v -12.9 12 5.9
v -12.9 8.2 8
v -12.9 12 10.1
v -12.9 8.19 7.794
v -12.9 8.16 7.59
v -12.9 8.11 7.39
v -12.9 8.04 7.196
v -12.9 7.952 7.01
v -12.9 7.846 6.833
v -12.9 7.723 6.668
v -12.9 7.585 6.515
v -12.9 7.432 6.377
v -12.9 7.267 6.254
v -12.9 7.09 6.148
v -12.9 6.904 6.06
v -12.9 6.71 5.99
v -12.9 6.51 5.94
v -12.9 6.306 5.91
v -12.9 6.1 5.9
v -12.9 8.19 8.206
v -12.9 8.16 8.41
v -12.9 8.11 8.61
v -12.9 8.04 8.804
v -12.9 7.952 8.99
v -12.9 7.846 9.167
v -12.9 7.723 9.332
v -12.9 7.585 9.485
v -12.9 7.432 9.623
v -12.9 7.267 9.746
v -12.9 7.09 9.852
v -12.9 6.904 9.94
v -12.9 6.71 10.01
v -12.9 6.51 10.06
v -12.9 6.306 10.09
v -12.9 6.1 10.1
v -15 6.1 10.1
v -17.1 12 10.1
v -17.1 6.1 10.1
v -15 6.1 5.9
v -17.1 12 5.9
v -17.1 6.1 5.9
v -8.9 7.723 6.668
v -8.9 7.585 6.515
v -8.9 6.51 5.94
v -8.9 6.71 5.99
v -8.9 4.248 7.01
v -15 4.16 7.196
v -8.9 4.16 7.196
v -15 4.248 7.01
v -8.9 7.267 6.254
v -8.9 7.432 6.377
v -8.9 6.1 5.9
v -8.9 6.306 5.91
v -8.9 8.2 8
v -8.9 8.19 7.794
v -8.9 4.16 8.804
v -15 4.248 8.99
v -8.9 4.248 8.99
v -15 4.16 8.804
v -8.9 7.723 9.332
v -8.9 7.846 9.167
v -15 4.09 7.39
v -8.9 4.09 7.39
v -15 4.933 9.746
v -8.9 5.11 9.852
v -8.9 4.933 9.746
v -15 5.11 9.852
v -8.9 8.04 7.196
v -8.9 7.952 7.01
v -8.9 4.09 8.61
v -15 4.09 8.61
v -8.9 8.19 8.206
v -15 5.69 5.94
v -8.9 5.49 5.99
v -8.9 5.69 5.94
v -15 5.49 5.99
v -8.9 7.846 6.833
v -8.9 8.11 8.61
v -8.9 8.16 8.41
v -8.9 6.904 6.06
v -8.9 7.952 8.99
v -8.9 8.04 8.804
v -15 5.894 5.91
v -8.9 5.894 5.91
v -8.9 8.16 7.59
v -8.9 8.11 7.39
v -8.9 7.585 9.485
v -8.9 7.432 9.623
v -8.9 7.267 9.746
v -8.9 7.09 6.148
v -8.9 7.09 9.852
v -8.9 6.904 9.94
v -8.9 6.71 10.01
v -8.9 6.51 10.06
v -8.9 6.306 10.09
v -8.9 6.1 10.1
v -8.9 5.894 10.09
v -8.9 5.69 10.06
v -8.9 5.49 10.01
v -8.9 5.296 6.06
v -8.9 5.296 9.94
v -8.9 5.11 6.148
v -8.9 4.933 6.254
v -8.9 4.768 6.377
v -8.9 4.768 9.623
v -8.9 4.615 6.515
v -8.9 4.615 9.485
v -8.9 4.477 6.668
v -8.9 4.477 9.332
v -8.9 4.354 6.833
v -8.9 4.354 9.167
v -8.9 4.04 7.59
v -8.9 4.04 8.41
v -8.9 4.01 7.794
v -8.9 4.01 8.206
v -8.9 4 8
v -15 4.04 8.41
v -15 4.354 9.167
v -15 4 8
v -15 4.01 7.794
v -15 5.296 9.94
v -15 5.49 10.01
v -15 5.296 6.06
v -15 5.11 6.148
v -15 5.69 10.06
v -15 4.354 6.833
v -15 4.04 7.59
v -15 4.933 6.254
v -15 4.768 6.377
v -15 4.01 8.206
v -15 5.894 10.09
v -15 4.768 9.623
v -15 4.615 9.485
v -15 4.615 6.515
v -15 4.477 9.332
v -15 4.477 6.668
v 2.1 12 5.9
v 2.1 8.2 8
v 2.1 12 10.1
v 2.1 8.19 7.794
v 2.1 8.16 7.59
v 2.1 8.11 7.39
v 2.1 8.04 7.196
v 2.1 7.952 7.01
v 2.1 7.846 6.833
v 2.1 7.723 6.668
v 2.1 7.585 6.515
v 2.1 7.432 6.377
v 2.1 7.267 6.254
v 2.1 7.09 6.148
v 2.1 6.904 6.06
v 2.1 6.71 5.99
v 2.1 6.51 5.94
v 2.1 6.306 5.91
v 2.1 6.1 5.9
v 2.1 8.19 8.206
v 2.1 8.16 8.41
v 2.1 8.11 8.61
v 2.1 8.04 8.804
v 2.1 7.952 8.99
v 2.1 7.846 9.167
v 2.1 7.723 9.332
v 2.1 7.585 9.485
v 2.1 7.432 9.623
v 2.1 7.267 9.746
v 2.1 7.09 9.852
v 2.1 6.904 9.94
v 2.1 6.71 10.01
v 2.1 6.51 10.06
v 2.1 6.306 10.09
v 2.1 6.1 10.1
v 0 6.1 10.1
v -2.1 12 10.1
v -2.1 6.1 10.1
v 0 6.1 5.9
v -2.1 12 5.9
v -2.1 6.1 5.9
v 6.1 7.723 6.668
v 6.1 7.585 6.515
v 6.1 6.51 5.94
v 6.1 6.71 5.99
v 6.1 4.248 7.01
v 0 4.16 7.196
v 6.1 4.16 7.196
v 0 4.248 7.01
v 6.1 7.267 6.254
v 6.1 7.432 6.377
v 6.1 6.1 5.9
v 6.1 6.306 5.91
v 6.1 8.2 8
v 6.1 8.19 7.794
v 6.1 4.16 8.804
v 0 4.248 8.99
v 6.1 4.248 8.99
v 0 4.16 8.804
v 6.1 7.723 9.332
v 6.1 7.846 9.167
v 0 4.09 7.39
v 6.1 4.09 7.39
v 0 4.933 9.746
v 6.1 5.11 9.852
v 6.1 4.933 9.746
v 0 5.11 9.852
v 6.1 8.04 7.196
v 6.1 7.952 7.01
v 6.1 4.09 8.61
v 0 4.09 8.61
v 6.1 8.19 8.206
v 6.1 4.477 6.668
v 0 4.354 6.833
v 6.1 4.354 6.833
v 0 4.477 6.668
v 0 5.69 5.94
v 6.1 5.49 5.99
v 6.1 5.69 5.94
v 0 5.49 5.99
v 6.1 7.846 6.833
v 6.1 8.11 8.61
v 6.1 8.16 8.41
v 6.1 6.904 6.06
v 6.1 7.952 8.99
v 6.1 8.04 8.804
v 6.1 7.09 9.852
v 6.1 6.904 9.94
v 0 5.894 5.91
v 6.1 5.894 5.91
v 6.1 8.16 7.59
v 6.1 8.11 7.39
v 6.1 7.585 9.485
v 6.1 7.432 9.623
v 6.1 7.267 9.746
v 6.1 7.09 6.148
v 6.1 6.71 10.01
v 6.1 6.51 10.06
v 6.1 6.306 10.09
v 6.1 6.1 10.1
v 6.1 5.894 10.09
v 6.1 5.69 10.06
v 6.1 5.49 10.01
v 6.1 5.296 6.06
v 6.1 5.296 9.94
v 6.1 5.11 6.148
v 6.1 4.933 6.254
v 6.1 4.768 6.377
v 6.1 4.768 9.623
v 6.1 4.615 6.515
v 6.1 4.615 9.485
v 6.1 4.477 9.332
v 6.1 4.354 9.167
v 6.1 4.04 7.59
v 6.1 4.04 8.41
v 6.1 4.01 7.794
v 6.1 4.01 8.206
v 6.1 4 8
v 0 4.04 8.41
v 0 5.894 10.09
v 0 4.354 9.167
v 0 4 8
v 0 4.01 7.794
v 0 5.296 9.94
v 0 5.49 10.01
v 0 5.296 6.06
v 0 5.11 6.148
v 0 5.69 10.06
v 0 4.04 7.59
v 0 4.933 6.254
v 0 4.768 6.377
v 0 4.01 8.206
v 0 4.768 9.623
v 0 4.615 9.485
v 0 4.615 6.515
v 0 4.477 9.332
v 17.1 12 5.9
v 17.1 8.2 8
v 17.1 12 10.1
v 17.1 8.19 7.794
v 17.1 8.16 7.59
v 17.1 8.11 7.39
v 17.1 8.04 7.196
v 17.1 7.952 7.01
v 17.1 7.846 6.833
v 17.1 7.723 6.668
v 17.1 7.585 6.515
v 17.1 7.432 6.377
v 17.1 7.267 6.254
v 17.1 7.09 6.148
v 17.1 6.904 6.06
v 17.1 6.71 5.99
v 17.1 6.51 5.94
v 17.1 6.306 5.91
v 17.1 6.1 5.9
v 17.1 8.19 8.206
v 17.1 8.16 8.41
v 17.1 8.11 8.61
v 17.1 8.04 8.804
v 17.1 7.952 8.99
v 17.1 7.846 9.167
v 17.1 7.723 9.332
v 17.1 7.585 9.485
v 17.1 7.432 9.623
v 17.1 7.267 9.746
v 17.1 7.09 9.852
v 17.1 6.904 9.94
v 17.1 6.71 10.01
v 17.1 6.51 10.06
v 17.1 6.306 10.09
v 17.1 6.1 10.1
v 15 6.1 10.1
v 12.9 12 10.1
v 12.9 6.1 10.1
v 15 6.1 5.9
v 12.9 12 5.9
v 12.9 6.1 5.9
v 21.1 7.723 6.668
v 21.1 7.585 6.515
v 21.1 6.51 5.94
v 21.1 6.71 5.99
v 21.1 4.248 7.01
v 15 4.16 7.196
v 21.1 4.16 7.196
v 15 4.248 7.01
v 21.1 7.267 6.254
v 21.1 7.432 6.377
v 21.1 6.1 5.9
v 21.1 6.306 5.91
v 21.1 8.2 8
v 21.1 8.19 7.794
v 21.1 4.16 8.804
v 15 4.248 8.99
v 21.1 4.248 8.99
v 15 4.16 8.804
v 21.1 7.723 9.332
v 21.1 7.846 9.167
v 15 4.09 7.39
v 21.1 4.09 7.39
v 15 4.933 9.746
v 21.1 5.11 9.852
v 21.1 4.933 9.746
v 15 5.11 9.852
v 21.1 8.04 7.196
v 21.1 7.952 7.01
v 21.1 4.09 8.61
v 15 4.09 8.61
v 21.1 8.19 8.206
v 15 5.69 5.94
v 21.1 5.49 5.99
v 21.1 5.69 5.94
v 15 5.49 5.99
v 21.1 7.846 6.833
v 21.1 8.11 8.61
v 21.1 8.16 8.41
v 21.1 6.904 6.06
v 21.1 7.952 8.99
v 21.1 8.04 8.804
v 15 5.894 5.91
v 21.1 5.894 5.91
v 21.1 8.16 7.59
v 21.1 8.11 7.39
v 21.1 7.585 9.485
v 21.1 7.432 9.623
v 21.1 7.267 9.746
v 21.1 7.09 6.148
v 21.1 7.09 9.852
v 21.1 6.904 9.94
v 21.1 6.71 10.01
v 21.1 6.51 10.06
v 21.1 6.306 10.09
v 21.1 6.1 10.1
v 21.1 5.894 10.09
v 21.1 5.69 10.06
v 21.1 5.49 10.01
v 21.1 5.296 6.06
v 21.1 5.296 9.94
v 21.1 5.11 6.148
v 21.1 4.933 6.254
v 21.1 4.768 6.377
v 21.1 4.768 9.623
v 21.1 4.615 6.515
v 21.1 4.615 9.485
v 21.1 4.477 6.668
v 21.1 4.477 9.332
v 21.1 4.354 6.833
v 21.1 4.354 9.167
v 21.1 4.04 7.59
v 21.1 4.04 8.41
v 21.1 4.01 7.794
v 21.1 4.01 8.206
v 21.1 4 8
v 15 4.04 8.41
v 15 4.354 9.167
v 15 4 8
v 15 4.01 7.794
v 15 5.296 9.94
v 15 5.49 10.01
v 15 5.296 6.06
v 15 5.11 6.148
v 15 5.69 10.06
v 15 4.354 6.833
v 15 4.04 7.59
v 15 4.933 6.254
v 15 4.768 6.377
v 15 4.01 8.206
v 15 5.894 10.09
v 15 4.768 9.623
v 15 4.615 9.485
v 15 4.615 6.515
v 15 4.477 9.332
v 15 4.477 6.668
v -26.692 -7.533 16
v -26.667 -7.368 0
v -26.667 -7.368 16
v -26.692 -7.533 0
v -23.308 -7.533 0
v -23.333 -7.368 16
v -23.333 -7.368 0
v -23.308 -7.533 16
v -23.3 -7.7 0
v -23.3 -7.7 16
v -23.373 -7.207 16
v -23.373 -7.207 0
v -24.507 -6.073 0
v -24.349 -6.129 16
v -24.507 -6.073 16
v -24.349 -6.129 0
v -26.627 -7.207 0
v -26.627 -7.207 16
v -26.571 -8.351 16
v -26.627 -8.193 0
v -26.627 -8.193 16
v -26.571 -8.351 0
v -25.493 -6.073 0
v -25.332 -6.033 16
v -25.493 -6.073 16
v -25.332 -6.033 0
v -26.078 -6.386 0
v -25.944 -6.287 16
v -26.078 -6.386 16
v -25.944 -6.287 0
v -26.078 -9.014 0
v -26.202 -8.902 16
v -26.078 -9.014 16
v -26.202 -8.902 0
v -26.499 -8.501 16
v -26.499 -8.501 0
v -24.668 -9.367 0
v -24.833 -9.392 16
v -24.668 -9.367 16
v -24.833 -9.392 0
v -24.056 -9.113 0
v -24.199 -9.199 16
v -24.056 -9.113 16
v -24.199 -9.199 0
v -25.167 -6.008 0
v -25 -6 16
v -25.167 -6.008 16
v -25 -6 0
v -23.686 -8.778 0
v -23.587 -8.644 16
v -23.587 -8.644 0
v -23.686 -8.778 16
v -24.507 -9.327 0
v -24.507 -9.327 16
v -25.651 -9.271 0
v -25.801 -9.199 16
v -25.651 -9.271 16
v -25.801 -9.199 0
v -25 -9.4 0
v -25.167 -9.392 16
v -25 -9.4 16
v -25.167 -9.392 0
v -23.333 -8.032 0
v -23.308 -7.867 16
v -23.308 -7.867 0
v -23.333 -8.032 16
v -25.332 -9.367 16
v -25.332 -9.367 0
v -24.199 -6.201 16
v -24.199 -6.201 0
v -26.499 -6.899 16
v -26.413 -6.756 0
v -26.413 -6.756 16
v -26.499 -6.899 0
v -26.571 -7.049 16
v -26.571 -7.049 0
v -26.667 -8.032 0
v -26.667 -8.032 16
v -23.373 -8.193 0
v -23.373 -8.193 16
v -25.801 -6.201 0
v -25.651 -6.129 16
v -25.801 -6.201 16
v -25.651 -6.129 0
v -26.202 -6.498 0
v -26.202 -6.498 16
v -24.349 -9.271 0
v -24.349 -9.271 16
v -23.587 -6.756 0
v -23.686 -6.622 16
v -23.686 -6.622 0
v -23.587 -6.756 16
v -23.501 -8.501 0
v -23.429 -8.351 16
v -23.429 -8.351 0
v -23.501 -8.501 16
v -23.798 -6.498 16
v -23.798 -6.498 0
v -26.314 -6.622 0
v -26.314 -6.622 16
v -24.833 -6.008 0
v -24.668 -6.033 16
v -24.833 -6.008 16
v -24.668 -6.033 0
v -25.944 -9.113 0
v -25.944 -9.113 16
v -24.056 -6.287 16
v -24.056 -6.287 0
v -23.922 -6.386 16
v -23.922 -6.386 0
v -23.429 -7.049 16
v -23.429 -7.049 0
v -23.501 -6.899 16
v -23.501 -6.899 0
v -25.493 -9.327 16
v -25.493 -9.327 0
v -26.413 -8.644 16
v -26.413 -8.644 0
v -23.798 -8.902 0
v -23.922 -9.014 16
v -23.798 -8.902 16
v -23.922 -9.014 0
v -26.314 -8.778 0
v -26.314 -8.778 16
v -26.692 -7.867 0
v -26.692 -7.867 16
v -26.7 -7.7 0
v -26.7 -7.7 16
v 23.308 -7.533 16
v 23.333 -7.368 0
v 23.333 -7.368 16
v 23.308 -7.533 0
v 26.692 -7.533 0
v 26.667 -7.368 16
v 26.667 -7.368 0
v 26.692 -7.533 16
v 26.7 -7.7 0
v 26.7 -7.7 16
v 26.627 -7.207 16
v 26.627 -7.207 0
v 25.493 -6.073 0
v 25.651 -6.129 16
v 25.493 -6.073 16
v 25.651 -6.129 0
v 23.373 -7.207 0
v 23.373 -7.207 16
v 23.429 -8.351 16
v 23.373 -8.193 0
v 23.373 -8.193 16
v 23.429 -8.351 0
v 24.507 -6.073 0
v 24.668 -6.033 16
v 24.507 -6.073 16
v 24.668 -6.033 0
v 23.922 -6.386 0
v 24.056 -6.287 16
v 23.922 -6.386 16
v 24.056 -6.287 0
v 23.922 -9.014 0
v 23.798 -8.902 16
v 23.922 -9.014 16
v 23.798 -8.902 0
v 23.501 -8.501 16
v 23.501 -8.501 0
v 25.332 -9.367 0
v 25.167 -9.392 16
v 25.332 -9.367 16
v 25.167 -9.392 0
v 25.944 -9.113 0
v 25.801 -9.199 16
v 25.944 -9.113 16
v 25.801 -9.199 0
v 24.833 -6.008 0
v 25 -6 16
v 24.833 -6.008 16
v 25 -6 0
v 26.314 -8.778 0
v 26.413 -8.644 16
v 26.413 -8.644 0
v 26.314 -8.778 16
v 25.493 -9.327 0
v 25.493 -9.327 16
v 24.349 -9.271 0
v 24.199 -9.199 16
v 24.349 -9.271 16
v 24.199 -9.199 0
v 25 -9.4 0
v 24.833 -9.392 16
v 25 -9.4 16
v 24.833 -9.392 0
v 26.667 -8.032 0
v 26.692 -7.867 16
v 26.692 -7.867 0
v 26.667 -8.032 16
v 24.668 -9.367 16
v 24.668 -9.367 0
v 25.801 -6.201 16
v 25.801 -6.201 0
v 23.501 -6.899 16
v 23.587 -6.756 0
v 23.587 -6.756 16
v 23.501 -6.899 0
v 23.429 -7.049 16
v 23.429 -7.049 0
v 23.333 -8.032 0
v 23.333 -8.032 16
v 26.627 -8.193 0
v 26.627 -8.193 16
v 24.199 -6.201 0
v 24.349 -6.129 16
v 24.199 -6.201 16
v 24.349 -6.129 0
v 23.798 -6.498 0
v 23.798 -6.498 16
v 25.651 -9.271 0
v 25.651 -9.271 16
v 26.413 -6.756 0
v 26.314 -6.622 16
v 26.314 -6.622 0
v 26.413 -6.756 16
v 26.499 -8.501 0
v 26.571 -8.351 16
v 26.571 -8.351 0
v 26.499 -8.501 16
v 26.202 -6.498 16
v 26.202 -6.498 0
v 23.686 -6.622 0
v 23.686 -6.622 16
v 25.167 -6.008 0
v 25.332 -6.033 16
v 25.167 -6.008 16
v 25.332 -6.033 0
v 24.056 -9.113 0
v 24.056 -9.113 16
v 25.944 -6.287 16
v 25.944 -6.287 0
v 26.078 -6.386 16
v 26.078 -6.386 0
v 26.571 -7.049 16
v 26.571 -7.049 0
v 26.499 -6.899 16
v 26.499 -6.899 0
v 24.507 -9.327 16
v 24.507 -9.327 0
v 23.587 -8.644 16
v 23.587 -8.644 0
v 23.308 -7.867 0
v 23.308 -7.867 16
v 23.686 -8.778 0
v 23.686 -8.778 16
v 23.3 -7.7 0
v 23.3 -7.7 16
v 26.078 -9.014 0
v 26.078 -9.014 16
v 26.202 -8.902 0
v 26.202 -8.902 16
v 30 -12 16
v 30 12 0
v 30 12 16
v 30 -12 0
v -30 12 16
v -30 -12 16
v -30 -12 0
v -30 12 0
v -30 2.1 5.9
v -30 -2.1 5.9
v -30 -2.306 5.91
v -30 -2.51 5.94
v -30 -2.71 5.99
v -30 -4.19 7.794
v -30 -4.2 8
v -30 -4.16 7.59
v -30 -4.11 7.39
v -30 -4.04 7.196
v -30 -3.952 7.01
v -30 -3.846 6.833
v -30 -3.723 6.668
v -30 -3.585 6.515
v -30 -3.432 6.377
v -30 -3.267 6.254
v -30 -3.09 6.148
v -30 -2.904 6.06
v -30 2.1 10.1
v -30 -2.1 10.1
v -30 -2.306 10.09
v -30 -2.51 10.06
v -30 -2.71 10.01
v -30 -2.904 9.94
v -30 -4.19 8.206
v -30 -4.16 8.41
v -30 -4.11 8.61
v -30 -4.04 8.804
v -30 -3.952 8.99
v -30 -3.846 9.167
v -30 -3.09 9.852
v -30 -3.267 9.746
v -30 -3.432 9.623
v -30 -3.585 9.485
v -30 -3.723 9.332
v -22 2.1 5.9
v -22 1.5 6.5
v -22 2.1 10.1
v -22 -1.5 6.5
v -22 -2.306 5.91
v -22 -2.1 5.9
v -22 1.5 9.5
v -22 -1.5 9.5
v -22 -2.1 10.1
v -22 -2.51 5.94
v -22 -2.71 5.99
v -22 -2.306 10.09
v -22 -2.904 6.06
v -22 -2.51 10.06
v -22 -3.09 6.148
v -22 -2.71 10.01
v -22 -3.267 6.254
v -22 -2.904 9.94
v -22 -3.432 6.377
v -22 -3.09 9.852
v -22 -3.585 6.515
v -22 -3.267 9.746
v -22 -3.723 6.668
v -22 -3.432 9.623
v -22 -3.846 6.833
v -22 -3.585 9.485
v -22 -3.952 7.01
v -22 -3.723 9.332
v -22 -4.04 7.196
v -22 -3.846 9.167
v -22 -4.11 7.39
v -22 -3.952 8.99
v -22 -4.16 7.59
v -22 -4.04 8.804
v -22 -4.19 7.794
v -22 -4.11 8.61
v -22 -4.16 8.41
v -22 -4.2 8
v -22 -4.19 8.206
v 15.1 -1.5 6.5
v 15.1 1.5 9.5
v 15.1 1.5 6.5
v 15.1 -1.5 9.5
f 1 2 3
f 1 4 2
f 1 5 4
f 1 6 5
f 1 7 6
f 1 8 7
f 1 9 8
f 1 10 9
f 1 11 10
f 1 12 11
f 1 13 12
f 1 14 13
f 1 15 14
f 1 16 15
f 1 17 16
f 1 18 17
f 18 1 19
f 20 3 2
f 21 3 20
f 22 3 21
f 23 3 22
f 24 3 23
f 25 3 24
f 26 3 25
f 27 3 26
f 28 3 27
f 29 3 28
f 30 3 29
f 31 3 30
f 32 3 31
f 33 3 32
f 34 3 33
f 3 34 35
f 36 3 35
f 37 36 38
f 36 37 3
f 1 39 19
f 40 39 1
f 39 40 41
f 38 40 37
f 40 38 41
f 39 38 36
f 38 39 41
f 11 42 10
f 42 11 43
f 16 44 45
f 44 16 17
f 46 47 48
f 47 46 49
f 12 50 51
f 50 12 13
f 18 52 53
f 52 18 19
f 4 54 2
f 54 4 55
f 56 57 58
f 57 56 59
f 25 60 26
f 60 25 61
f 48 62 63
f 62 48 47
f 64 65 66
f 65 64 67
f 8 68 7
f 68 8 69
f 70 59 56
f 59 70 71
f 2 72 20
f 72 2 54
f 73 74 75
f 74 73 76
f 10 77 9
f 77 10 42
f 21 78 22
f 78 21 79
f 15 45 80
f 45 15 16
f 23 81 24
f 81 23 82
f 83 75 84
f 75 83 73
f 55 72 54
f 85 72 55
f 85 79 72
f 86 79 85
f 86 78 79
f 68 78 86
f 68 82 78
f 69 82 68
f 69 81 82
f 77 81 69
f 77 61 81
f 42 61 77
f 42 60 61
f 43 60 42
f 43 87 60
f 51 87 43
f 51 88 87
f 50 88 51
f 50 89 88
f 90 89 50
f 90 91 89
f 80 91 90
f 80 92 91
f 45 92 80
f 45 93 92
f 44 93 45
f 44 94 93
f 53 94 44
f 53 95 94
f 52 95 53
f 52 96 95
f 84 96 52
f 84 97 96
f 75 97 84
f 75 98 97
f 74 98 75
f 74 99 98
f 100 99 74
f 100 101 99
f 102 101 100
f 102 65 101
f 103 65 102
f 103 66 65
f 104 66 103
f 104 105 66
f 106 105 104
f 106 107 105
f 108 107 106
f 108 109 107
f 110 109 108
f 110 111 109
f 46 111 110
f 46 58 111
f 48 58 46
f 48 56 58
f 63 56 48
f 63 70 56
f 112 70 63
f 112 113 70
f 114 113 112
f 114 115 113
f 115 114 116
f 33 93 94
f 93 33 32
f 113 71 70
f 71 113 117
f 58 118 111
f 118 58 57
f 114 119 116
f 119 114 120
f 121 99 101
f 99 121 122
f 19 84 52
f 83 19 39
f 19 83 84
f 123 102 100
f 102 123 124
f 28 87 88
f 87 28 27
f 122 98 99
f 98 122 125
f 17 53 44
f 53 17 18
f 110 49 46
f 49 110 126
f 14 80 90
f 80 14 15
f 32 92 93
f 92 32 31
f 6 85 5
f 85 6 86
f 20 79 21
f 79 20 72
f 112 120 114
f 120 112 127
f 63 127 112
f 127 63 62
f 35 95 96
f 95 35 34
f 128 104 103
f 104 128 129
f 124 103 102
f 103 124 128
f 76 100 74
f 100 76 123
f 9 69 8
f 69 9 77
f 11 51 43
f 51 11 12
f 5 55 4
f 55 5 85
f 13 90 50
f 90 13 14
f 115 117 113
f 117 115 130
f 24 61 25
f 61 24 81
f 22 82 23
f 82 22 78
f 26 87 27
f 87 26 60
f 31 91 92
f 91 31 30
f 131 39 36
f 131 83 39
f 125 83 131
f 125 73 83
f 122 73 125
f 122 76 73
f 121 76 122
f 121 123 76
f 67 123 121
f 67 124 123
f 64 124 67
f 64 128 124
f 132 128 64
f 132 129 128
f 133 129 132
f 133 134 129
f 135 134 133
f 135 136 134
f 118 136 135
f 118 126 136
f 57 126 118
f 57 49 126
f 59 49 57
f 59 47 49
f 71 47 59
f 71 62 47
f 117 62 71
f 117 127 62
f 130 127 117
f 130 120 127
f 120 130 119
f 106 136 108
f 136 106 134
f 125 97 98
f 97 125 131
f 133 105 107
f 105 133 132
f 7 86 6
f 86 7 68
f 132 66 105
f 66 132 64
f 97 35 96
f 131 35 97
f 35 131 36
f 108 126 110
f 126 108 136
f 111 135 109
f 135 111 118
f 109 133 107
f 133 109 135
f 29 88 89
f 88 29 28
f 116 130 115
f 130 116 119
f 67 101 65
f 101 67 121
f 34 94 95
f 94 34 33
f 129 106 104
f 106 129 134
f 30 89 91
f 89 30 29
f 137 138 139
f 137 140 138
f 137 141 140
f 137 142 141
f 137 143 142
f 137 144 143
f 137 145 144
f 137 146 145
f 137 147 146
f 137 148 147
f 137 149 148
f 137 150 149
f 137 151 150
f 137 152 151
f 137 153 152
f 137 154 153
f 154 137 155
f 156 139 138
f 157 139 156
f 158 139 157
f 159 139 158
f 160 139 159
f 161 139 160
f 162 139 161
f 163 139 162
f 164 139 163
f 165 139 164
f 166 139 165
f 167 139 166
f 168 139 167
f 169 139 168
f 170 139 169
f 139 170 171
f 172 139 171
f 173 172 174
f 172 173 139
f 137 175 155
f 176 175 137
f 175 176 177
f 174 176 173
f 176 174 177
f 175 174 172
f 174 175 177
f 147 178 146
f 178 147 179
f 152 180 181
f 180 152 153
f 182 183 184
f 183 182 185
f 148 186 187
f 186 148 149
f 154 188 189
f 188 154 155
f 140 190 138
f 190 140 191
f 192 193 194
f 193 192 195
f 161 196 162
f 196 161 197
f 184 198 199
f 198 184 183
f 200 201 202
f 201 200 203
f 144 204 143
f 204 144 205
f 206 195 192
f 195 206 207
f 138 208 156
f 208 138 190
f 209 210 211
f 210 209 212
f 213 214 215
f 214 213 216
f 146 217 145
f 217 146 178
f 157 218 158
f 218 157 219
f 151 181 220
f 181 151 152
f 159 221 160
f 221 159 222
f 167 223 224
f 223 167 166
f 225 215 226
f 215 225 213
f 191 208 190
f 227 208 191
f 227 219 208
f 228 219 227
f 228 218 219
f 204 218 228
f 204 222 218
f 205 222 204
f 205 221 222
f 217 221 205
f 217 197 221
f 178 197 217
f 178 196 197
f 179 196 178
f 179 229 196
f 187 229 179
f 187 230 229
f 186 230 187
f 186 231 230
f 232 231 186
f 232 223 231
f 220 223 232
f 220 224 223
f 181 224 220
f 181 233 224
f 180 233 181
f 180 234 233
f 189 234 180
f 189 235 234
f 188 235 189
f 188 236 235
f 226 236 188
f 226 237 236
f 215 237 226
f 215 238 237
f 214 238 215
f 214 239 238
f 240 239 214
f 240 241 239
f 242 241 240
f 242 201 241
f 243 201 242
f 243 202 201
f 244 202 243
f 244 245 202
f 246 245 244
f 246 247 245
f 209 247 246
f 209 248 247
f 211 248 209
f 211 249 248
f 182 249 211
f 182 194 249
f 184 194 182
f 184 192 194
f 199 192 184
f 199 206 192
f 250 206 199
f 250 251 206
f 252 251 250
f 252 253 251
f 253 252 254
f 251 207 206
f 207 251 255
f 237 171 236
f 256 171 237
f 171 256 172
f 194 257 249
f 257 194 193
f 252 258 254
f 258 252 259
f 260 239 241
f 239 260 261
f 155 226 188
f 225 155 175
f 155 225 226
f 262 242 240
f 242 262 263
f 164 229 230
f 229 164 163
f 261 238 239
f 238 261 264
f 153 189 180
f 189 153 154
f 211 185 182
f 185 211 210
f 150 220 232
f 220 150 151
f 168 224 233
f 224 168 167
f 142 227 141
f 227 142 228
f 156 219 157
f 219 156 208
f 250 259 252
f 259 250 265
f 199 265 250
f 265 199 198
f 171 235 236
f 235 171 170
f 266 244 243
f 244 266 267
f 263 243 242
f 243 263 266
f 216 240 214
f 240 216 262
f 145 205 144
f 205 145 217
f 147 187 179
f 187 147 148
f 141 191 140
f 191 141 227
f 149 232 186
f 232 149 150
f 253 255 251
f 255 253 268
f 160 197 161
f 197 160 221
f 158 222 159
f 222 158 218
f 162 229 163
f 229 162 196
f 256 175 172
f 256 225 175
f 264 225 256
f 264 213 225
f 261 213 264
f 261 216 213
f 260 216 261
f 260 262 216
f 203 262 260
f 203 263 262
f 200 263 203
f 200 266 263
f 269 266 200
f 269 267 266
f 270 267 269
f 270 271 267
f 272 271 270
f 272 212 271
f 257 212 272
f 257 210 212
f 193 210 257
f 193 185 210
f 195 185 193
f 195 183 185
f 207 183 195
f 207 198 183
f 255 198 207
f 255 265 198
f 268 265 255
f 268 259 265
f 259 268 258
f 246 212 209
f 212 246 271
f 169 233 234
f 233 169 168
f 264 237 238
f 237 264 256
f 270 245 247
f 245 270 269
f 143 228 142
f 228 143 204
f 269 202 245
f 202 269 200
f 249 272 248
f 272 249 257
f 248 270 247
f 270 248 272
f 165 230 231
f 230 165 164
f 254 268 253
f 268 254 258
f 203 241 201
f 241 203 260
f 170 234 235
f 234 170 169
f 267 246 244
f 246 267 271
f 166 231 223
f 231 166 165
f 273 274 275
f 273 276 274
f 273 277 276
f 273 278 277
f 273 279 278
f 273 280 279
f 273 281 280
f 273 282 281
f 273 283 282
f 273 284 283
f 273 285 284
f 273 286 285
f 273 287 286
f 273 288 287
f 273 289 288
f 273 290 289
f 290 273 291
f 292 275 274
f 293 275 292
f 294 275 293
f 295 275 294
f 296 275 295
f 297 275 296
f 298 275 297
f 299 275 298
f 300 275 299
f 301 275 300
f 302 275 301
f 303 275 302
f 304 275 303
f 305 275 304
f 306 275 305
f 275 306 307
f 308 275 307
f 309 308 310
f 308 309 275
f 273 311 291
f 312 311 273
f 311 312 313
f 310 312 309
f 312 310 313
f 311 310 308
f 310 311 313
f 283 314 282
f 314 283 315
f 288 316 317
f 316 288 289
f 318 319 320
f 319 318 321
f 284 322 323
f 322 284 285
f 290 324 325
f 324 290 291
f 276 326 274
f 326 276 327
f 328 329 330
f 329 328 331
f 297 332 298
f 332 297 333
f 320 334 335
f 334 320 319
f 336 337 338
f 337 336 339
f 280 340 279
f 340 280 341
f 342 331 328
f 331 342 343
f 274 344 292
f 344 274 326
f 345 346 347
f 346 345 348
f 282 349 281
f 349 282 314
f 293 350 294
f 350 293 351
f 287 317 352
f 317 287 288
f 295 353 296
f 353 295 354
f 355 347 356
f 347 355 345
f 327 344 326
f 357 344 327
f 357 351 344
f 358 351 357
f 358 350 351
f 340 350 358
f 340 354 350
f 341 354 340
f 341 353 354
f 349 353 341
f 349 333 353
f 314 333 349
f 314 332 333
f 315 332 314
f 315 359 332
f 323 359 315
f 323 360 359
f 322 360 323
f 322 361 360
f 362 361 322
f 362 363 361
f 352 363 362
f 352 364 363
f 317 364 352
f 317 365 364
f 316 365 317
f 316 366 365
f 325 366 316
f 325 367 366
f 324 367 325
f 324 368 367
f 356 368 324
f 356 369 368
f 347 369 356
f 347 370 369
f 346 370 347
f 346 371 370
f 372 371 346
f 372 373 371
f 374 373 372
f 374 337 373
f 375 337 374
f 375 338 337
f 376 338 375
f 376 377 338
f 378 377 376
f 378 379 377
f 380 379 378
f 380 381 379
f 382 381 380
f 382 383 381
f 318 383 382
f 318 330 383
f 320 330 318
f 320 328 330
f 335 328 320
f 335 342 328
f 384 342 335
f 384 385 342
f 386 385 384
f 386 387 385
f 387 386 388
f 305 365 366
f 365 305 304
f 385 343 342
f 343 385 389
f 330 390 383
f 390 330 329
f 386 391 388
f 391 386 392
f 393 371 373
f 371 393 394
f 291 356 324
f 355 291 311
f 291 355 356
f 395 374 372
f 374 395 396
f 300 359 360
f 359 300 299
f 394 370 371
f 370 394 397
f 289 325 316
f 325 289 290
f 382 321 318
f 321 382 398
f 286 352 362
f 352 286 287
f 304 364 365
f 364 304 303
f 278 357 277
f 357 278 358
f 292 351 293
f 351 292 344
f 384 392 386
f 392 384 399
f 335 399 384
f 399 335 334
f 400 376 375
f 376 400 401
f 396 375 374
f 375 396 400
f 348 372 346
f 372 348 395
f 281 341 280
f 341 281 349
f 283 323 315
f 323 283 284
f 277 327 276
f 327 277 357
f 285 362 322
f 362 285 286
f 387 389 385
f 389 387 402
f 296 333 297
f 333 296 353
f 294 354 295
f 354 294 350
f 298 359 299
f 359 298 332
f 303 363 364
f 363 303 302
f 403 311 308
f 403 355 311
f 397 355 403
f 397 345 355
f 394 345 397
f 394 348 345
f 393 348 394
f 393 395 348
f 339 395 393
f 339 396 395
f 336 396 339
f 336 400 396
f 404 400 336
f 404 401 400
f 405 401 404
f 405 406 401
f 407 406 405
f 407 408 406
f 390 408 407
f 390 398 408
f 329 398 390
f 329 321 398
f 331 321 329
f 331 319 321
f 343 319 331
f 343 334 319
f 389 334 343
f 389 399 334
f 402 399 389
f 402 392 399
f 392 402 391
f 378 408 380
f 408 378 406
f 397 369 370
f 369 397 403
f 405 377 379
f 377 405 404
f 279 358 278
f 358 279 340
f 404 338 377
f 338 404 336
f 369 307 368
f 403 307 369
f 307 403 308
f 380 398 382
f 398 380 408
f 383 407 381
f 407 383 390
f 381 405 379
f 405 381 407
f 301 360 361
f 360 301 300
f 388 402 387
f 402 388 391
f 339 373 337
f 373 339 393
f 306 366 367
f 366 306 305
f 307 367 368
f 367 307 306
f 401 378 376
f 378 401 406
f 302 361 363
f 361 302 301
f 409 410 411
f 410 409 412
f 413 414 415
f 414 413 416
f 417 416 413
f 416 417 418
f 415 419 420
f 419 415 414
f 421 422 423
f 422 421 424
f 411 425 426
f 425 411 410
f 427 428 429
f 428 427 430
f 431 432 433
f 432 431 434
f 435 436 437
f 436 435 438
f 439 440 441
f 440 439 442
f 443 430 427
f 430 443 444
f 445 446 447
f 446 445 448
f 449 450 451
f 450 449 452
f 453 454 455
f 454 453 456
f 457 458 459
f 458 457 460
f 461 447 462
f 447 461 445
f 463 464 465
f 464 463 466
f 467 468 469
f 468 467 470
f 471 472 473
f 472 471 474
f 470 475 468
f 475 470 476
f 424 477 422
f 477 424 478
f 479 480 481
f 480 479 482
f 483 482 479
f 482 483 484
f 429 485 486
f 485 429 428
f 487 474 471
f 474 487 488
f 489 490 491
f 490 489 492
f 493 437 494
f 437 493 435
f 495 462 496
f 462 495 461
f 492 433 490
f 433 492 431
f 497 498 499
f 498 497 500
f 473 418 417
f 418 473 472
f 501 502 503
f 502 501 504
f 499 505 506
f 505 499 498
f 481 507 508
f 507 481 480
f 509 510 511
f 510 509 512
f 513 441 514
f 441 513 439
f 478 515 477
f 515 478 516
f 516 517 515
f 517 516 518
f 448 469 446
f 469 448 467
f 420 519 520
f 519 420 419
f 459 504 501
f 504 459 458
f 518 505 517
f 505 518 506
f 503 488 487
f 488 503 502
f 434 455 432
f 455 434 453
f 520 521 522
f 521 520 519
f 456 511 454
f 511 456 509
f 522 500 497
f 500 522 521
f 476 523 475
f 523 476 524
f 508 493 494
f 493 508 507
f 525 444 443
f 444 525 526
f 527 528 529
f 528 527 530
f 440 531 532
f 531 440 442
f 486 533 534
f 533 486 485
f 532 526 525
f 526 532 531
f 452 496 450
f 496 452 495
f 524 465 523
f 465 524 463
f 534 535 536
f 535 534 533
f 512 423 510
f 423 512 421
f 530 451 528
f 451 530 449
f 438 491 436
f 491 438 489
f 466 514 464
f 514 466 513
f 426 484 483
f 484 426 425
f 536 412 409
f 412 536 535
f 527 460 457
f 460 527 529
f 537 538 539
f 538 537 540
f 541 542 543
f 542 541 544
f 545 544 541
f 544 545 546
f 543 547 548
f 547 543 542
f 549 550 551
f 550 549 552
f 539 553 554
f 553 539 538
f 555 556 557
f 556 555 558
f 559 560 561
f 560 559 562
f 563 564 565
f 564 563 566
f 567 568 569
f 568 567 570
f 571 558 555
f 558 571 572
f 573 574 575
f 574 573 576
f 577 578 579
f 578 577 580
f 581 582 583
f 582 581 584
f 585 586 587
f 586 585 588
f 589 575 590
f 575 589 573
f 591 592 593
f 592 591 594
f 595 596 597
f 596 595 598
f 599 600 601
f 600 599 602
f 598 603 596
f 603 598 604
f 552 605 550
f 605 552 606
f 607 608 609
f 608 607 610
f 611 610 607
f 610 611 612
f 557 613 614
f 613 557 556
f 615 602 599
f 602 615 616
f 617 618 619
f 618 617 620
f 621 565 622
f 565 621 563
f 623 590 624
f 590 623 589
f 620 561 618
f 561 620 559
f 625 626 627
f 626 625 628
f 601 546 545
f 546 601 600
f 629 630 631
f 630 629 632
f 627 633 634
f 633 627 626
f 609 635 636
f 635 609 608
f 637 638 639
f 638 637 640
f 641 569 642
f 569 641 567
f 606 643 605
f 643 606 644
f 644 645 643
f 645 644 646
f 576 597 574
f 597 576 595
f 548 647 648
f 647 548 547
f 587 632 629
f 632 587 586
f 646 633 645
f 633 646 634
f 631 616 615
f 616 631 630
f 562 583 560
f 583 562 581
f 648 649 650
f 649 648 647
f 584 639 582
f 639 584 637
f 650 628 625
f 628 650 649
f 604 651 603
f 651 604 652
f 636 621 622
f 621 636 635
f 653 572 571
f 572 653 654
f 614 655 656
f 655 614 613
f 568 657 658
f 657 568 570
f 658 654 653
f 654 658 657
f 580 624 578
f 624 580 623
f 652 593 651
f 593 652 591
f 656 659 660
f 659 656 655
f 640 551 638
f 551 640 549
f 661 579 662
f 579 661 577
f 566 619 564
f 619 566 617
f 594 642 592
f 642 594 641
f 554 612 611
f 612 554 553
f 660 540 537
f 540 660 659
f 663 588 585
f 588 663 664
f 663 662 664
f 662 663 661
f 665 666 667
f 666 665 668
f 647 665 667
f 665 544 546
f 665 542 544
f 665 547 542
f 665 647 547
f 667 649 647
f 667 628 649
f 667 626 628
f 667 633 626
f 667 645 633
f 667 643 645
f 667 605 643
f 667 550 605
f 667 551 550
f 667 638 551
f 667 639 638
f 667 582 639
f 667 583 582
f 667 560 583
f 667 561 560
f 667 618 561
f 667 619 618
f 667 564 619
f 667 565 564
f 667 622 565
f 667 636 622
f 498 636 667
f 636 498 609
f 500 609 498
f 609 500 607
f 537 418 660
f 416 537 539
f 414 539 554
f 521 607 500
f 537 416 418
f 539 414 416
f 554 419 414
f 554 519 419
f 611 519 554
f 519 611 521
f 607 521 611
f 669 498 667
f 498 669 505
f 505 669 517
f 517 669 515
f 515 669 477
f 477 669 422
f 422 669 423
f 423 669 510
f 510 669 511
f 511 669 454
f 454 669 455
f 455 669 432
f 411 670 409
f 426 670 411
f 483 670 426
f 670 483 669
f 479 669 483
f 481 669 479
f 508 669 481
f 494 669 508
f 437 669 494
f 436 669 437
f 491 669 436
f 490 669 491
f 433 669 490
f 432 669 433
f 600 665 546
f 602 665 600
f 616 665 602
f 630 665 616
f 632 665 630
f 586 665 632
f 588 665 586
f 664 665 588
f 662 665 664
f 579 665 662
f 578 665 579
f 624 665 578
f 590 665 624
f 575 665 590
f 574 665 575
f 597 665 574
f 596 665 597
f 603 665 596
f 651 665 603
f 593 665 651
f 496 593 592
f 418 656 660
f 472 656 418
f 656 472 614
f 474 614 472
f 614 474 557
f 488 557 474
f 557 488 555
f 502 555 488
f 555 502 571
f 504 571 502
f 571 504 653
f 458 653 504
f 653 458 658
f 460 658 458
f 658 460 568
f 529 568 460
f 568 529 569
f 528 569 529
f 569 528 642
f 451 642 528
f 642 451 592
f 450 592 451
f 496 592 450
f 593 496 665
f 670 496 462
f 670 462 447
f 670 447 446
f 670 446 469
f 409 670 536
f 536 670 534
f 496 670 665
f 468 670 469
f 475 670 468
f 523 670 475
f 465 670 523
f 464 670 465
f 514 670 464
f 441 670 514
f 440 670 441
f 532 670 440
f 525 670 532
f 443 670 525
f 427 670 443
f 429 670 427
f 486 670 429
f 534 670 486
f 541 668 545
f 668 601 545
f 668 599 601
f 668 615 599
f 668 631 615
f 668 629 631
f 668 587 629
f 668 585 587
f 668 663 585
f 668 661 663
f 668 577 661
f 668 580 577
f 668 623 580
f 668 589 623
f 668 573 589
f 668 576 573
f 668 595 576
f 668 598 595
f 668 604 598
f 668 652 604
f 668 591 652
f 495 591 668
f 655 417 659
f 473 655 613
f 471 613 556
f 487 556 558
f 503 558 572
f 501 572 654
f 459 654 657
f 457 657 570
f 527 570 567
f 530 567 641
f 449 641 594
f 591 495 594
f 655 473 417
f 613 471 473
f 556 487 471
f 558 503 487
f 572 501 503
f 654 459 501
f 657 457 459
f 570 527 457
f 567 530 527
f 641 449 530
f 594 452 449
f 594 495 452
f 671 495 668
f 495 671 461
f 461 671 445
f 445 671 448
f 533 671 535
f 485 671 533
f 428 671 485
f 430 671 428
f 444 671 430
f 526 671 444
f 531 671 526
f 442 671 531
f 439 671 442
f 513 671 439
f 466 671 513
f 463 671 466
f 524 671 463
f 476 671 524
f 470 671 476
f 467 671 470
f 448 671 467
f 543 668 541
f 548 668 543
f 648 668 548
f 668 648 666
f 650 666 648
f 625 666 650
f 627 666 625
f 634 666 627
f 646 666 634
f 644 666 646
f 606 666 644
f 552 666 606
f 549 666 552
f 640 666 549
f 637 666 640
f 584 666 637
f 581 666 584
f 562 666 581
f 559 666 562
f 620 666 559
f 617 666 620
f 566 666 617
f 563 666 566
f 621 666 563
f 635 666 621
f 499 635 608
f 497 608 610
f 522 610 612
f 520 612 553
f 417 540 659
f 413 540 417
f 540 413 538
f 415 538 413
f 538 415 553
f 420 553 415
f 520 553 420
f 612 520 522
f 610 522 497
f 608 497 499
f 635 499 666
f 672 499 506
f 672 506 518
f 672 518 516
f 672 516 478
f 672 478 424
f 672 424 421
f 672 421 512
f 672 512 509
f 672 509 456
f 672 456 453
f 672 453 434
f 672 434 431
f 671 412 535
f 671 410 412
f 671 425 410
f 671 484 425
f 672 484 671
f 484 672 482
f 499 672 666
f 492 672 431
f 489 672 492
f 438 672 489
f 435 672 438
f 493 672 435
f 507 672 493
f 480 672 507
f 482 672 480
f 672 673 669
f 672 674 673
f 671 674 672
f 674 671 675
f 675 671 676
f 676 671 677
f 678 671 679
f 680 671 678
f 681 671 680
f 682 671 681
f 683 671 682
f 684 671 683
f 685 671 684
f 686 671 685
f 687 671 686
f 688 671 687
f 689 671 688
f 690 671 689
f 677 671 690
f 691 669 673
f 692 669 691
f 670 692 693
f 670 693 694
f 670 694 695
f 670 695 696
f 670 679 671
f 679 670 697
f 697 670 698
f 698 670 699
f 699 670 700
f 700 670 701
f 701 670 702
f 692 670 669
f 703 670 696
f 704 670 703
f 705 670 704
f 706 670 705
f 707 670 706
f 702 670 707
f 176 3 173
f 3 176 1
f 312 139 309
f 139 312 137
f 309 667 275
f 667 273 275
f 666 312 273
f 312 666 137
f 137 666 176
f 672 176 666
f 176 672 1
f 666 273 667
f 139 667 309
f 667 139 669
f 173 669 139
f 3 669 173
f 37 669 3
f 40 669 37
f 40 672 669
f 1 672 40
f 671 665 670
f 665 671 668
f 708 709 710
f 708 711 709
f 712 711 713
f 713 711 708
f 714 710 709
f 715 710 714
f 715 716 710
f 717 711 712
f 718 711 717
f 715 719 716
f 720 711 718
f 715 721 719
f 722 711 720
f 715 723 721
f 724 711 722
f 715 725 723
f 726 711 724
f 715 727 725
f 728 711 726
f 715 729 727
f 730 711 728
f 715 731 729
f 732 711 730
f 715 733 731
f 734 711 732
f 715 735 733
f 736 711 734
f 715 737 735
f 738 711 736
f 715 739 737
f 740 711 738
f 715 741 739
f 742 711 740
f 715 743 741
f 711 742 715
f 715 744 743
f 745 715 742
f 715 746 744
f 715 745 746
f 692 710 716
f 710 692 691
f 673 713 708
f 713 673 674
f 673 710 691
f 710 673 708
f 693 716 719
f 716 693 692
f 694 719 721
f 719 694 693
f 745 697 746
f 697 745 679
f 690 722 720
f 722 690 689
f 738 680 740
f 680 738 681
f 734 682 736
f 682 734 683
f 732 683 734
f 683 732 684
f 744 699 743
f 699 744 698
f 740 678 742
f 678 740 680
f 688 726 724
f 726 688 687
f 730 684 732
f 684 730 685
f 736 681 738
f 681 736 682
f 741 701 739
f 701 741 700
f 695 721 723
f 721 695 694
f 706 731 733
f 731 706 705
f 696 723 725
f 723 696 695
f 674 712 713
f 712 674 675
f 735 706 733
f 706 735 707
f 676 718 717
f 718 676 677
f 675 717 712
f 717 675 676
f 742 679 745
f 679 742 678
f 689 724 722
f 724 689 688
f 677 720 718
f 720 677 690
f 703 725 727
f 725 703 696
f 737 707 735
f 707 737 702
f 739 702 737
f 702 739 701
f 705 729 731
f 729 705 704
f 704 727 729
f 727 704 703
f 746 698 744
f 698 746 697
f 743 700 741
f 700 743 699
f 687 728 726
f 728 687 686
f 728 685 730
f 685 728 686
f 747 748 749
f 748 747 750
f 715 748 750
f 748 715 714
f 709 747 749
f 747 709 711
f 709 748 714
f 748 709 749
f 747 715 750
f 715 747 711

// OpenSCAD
// --- Dimensions (mm) ---
block_x = 60;            // Total length of block
block_y = 24;            // Total width of block
block_z = 16;            // Total height of block

channel_dia = 3;         // Diameter of internal channels
inlet_socket_dia = 4.2;  // Diameter of inlet socket
inlet_socket_depth = 8;  // Depth of inlet socket
outlet_socket_dia = 4.2; // Diameter of outlet sockets
outlet_socket_depth = 6; // Depth of outlet sockets

// The main channel runs from the inlet (-30) to x = 15.
// Total length of main channel = 30 (to center) + 15 (from center) = 45mm.
main_channel_length = 45; 

// Outlet positions relative to origin
outlet_x_positions = [-15, 0, 15]; 

screw_hole_dia = 3.4;    // Diameter for M3 screw holes
screw_hole_x = [-25, 25]; // X positions of screw holes
screw_hole_y = -6;       // Y position of screw holes

// --- Constants ---
$fn = 64;

// --- Main Block Construction ---
difference() {
    // The main solid block
    // Centered on X and Y, resting on Z=0
    translate([-block_x/2, -block_y/2, 0])
        cube([block_x, block_y, block_z]);

    // 1. Inlet Socket (-X face, at y=0, centered on Z)
    // Face is at x = -30. Socket goes 8mm deep into the block.
    // Socket is centered on Y=0 and Z=8.
    translate([-block_x/2 - 0.1, -inlet_socket_dia/2, 8 - inlet_socket_dia/2])
        cube([inlet_socket_depth + 0.1, inlet_socket_dia, inlet_socket_dia]);
    
    // Using cylinder for the socket to ensure it's a proper socket/bore
    translate([-block_x/2 - 0.1, -inlet_socket_dia/2, 8])
        rotate([0, 90, 0])
            cylinder(h = inlet_socket_depth + 0.1, d = inlet_socket_dia);

    // 2. Main Channel
    // Runs from the inlet (-30) to x = 15.
    // The inlet socket is at x=-30, so the channel starts there.
    // Total length = 30 + 15 = 45.
    translate([-block_x/2 + 0.1, -channel_dia/2, 8 - channel_dia/2])
        cube([main_channel_length, channel_dia, channel_dia]);
    
    // Using cylinder for the main channel for smooth flow and better rendering
    translate([-block_x/2 + 0.1, 0, 8])
        rotate([0, 90, 0])
            cylinder(h = main_channel_length, d = channel_dia);

    // 3. Outlet Sockets (+Y face)
    // Three outlets at x = -15, 0, 15. 
    // They run in +Y direction to the +Y face (y = 12).
    // They end at the face, so they are cut from the face inward.
    for (ox = outlet_x_positions) {
        translate([ox - outlet_socket_dia/2, block_y/2 - outlet_socket_depth + 0.1, 8 - outlet_socket_dia/2])
            cube([outlet_socket_dia, outlet_socket_depth, outlet_socket_dia]);
            
        // Using cylinder for the socket to ensure it's a proper socket/bore
        translate([ox, block_y/2 - outlet_socket_depth + 0.1, 8])
            rotate([0, 90, 0])
                cylinder(h = outlet_socket_depth + 0.1, d = outlet_socket_dia);
    }

    // 4. Screw Holes (Vertical through-holes)
    // Through the block at x = -25 and 25, y = -6.
    for (sx = screw_hole_x) {
        translate([sx, screw_hole_y - screw_hole_dia/2, -0.1])
            cylinder(h = block_z + 0.2, d = screw_hole_dia);
    }
}
